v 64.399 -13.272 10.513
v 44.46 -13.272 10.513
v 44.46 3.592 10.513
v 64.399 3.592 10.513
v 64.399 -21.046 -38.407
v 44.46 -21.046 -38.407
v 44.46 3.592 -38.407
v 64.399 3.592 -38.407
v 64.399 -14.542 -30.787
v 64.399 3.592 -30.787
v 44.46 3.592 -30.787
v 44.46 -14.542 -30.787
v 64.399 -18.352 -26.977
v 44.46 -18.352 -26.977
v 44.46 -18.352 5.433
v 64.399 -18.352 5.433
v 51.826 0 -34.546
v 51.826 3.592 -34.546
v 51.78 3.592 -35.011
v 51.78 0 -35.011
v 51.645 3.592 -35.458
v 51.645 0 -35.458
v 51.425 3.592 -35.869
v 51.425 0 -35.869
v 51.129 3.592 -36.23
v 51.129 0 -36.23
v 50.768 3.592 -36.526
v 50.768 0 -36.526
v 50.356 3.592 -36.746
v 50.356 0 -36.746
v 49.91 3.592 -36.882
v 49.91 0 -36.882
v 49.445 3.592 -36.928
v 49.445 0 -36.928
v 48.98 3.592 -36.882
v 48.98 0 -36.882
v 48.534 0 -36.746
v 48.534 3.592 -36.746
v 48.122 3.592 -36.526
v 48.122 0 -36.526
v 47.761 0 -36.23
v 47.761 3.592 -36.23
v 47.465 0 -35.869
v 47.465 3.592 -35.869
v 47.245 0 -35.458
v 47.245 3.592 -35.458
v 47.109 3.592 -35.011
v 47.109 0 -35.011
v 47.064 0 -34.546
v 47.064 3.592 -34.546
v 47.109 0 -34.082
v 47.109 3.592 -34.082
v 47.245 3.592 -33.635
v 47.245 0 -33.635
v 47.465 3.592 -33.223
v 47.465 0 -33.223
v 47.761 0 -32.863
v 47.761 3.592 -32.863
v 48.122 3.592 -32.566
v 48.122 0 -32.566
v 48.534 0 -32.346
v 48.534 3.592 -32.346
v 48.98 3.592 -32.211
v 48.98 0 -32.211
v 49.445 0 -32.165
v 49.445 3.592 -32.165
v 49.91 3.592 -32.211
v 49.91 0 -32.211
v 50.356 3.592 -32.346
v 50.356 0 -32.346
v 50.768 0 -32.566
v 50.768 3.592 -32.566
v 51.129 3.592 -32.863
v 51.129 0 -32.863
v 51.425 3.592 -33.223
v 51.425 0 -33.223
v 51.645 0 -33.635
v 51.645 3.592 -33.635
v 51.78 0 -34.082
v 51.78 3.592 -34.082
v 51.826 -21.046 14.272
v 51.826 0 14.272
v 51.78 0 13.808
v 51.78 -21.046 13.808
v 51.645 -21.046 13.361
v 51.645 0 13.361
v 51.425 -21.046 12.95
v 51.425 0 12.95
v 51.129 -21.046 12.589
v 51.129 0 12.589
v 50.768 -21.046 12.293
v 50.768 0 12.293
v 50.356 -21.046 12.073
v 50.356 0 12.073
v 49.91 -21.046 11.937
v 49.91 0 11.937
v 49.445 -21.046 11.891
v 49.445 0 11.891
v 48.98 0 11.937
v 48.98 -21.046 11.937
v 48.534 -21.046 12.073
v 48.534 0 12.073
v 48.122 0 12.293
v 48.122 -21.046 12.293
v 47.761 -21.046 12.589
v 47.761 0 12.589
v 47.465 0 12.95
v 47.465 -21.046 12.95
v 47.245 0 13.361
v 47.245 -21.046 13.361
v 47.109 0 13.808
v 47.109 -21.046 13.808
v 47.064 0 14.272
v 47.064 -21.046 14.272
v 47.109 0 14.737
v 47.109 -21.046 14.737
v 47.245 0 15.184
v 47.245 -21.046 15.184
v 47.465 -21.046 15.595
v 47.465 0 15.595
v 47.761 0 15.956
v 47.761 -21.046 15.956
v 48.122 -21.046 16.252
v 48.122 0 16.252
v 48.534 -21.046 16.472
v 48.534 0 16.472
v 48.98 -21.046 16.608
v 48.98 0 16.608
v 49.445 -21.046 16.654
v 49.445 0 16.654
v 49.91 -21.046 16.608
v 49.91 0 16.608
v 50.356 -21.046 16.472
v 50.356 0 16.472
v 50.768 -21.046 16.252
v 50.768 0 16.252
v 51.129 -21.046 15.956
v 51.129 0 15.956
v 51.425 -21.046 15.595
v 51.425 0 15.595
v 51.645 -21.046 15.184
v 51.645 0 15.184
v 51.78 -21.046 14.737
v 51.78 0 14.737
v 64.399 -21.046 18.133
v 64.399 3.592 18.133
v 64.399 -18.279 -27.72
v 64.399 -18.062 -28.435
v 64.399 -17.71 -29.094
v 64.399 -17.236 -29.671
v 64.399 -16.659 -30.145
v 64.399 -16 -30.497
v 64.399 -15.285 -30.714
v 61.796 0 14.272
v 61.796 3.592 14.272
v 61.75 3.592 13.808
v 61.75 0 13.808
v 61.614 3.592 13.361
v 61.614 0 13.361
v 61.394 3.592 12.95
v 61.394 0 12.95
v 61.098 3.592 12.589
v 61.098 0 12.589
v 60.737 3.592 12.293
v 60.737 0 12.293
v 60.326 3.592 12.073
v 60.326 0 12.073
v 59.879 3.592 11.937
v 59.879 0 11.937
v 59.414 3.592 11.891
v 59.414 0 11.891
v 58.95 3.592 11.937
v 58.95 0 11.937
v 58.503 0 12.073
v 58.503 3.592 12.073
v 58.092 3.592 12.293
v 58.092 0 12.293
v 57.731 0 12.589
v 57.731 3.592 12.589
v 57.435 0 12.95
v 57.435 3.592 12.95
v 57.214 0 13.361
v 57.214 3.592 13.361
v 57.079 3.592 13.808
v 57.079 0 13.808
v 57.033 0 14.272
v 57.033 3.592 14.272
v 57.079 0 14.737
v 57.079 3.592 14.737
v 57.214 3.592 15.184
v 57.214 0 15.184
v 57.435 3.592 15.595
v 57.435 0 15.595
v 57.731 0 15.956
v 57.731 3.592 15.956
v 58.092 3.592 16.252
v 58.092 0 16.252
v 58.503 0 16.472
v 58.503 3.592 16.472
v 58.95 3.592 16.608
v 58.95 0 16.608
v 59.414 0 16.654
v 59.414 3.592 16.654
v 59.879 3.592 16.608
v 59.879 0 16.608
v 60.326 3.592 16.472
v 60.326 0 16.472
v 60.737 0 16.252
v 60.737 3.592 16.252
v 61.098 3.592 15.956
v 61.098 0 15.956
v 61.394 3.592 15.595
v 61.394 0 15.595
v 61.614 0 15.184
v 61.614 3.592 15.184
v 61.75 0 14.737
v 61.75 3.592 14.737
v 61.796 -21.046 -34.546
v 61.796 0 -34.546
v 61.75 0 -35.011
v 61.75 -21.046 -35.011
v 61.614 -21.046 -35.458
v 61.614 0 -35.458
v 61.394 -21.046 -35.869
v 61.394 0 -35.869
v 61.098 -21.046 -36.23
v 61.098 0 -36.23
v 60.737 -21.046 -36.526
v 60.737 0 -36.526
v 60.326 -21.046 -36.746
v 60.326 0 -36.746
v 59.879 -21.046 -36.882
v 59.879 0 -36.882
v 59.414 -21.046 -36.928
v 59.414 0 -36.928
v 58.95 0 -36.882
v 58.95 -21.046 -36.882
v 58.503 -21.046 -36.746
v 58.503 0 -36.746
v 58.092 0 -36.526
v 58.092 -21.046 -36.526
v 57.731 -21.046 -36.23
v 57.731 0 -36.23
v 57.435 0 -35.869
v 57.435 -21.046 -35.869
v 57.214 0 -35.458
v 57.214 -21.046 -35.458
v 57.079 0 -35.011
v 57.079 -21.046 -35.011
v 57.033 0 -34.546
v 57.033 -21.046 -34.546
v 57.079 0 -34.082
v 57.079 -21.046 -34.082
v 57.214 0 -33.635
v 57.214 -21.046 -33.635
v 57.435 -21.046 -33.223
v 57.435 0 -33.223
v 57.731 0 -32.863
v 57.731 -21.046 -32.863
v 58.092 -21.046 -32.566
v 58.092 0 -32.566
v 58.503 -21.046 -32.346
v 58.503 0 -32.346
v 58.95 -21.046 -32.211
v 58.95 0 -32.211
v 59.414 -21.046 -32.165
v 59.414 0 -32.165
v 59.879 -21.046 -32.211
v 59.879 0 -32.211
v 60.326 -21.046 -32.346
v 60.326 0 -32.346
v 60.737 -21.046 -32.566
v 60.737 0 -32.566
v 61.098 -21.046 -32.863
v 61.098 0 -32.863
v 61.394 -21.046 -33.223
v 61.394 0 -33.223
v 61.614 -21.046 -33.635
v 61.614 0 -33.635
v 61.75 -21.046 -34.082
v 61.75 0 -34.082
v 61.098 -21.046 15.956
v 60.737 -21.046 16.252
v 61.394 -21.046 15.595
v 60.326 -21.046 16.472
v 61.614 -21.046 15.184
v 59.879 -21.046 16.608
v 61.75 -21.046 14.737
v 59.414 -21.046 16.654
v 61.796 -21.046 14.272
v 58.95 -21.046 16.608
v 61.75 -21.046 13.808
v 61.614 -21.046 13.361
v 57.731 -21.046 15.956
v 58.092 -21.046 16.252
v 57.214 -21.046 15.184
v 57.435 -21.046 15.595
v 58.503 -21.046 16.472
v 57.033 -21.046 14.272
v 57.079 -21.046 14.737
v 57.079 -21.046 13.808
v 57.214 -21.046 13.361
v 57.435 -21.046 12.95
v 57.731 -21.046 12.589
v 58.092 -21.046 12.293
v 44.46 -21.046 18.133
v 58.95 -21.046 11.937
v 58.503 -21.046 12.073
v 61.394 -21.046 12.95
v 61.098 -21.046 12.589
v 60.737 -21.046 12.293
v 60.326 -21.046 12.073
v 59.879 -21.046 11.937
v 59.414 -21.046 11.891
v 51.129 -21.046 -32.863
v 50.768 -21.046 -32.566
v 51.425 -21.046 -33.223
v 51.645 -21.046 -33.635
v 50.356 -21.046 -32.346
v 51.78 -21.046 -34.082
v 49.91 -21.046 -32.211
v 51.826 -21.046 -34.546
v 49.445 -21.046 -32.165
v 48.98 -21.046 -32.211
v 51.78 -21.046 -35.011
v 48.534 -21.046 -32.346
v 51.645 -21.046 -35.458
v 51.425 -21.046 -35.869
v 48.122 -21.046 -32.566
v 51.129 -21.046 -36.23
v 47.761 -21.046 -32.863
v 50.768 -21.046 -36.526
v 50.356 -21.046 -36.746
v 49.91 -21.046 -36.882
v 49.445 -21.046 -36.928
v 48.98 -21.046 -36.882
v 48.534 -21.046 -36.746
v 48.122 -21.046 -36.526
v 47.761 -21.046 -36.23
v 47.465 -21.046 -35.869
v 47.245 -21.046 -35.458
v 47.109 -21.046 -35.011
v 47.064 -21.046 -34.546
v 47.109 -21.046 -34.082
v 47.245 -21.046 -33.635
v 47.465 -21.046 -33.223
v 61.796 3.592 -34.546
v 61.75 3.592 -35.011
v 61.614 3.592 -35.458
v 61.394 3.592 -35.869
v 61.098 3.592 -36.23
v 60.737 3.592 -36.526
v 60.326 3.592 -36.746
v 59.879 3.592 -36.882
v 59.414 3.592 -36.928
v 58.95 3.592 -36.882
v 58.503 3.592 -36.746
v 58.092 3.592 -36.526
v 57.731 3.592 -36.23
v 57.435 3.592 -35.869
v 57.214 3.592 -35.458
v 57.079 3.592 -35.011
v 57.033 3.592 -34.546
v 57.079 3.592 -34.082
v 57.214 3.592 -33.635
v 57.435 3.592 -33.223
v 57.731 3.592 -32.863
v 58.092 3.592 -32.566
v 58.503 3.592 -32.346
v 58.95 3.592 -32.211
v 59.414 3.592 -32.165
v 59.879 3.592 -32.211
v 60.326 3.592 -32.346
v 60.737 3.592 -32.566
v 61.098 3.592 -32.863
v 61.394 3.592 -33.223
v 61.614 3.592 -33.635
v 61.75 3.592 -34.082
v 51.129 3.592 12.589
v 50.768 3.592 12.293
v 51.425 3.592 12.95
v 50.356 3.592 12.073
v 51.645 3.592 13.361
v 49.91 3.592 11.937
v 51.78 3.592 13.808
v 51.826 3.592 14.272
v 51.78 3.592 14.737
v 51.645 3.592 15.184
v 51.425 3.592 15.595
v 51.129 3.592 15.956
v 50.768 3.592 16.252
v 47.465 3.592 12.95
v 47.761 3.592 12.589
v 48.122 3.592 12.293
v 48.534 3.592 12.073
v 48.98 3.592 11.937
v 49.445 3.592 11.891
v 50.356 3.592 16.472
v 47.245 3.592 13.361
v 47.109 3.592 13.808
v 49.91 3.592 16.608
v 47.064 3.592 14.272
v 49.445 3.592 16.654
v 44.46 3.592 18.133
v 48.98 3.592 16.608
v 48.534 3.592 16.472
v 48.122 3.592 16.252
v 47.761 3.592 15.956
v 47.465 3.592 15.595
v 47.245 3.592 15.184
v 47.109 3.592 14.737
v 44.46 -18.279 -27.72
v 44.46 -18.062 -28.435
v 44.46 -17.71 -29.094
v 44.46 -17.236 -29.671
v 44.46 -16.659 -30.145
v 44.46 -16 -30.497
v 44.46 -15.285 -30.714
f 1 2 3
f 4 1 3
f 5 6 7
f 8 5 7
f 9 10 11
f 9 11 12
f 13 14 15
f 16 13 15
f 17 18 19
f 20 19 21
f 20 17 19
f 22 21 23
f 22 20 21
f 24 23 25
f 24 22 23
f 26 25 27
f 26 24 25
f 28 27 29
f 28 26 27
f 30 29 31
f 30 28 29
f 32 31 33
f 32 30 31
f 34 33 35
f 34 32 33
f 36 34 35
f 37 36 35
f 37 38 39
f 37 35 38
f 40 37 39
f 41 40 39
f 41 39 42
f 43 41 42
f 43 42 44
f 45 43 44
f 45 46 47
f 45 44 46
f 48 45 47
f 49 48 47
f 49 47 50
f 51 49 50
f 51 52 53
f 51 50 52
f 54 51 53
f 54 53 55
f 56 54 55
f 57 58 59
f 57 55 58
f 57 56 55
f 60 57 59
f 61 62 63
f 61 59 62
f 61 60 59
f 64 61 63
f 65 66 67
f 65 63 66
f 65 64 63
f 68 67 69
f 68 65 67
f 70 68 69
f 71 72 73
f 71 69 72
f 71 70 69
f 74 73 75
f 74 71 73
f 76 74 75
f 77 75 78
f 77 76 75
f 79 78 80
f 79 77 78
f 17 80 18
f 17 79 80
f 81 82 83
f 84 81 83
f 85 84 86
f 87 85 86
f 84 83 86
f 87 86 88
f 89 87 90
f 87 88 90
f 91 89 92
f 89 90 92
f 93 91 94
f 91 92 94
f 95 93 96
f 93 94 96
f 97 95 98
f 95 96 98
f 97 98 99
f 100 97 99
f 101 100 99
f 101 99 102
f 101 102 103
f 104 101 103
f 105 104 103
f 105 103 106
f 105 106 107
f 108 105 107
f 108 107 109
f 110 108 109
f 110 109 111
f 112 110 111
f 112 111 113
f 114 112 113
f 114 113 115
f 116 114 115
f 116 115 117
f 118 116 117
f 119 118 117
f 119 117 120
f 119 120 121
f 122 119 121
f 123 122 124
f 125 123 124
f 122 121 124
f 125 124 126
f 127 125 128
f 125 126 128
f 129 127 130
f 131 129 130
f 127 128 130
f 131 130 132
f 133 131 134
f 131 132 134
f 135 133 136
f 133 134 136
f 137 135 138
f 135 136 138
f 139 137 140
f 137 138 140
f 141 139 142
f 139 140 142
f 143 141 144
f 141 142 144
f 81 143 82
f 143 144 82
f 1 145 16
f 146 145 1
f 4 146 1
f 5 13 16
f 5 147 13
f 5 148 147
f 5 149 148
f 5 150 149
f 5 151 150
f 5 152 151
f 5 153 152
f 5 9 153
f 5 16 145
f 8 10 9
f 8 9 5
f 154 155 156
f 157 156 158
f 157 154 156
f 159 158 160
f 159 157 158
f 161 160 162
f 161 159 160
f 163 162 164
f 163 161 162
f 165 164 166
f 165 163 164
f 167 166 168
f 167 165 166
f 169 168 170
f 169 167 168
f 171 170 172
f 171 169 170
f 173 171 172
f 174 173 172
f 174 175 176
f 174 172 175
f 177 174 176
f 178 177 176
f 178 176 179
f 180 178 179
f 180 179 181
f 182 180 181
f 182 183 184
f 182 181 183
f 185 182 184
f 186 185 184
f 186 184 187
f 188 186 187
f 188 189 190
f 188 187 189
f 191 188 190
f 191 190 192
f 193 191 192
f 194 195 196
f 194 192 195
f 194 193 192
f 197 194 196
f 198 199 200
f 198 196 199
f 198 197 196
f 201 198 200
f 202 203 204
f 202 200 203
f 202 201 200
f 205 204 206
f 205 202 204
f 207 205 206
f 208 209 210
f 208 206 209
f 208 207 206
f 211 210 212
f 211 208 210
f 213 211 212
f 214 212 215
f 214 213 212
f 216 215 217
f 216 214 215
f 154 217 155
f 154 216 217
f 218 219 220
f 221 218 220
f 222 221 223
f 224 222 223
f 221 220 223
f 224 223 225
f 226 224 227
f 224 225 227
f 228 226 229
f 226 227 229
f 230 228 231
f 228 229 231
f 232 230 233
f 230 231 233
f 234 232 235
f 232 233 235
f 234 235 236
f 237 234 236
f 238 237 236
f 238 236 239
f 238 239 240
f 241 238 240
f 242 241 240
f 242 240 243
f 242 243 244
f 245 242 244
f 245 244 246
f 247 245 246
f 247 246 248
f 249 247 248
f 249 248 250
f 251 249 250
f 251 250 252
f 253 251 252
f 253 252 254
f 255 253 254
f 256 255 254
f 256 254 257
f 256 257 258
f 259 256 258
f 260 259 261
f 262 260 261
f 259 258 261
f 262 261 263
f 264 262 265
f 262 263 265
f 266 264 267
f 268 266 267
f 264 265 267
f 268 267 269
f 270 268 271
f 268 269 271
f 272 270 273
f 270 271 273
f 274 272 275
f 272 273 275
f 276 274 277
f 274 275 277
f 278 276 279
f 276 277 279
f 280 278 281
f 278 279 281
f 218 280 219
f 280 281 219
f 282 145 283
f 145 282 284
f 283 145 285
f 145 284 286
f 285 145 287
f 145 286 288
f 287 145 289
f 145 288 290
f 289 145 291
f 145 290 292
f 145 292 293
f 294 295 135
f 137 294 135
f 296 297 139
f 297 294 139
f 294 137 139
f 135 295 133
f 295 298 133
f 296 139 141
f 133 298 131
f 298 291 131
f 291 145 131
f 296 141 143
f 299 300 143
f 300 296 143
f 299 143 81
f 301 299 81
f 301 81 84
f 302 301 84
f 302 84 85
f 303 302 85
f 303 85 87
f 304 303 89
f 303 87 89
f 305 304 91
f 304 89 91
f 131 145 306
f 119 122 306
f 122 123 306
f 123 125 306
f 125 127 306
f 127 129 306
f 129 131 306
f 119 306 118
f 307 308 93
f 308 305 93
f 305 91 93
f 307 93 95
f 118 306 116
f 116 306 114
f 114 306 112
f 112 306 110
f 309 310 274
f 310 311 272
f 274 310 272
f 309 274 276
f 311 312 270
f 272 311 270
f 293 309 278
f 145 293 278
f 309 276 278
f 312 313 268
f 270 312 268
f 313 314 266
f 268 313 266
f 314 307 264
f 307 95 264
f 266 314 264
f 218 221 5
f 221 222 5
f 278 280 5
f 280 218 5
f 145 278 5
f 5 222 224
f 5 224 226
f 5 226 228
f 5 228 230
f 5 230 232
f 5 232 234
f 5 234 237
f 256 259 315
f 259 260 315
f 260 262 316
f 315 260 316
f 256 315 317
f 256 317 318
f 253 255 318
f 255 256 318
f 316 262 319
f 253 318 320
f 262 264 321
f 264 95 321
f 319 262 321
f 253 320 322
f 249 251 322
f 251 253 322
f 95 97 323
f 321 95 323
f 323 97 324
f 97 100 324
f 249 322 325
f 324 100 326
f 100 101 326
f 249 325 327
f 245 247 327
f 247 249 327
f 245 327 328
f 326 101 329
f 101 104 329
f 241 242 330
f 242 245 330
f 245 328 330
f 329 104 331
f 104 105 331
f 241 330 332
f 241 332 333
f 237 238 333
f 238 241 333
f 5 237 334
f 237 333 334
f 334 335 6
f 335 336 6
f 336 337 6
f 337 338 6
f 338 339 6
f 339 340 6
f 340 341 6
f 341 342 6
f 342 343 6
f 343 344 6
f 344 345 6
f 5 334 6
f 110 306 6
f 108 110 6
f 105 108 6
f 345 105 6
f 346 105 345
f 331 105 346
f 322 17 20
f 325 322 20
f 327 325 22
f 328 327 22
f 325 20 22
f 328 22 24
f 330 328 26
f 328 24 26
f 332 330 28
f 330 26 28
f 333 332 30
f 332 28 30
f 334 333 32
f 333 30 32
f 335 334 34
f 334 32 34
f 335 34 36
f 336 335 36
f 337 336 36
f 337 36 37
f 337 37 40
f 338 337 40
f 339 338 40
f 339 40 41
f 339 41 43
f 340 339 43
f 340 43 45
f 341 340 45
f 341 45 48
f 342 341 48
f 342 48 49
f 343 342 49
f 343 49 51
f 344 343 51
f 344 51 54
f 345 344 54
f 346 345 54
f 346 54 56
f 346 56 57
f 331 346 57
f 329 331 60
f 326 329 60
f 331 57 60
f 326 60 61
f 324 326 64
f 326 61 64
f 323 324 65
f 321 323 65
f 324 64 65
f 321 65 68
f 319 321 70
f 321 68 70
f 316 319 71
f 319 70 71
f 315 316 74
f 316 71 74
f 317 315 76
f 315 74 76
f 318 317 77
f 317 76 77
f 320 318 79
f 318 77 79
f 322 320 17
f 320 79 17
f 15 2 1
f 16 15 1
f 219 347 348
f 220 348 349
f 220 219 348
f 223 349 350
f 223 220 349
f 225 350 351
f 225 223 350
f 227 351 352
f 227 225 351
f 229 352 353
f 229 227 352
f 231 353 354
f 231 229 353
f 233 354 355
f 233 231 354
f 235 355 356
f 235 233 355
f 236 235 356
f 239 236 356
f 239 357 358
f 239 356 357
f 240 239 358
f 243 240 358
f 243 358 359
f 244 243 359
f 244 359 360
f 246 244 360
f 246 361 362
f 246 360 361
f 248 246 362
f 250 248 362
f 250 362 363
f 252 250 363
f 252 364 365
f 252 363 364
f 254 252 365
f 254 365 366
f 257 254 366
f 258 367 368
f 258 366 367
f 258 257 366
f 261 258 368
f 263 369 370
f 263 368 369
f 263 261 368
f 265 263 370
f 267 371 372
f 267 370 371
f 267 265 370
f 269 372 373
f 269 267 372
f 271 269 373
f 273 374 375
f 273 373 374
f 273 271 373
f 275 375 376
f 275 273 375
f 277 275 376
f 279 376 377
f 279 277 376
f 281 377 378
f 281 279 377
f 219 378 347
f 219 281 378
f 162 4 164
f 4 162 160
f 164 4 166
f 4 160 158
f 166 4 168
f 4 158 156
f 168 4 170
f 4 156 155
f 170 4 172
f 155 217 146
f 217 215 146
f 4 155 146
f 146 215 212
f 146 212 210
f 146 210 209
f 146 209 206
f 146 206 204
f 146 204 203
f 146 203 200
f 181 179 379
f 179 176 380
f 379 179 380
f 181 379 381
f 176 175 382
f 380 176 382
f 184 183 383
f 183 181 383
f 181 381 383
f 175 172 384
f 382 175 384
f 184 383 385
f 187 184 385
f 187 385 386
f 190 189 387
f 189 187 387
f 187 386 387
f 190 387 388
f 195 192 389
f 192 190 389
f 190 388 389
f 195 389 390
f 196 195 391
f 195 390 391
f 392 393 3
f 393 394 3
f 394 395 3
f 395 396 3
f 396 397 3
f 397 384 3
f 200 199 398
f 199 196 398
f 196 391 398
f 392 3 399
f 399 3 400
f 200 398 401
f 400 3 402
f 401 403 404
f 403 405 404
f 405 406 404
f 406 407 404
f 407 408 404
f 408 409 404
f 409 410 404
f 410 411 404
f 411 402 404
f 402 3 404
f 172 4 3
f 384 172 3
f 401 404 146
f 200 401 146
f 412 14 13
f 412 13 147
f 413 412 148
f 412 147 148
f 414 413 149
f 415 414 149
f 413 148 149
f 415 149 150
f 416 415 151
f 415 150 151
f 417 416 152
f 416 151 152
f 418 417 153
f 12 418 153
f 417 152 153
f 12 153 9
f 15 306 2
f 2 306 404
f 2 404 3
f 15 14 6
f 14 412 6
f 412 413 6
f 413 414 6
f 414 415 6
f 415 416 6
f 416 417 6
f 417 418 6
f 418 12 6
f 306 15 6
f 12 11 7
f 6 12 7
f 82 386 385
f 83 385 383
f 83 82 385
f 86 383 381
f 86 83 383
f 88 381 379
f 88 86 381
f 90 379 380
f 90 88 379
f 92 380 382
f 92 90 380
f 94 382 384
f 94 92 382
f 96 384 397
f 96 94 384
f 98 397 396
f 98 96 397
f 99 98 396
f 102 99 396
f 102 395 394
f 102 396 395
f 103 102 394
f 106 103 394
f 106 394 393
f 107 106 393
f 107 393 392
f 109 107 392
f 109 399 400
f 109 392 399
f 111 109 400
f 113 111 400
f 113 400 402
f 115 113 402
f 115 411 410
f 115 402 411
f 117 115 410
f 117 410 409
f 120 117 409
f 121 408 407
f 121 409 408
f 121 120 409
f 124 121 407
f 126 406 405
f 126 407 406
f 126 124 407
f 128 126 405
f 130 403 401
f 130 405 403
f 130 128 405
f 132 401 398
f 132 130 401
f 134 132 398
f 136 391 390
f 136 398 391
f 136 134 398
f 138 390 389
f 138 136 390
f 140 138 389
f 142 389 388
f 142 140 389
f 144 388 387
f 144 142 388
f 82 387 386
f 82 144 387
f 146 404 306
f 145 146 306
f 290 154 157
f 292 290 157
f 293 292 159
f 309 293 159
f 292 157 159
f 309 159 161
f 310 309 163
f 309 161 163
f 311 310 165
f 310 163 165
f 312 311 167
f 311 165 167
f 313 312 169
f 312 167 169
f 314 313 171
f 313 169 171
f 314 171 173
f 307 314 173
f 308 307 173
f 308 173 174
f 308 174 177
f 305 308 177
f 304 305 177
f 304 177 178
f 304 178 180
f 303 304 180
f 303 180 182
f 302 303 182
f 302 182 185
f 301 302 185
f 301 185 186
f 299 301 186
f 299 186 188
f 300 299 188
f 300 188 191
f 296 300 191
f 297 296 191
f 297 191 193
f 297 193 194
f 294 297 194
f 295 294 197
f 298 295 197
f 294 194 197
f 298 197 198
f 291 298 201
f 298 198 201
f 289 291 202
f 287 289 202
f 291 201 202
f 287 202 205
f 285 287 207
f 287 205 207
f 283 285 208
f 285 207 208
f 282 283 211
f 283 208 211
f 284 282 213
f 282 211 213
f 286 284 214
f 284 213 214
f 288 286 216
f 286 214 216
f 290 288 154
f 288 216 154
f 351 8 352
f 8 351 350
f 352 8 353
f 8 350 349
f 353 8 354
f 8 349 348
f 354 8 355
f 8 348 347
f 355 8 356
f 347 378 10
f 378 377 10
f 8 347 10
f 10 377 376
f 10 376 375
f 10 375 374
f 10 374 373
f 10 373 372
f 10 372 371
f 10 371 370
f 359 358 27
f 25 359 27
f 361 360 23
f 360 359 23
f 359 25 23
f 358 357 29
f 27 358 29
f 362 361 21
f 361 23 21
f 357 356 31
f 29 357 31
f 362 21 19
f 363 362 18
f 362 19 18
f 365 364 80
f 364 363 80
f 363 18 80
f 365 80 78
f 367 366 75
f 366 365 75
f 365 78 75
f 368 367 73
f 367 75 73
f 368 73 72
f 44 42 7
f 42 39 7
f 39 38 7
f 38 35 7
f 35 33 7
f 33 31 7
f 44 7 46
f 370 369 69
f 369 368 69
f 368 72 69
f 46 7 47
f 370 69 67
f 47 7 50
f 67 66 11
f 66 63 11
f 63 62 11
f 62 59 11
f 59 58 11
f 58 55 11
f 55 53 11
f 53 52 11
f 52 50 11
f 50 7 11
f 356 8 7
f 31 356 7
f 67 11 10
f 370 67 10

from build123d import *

# Parameters (mm, degrees)
BOSS_EXTRUDE3_START     = 44.460213
BOSS_EXTRUDE3_DEPTH     = 19.939
CHAMFER2_SIZE           = 5.08
FILLET2_R               = 3.81
SKETCH4_R               = 2.38125
CUT_EXTRUDE1_DEPTH      = 4.591914717
CUT_EXTRUDE1_DEPTH_BACK = 22.046085283


with BuildPart() as part:
    # Sketch3 → Boss-Extrude3 (new body)
    with BuildSketch(Plane(origin=(0, 0, 0), x_dir=(0, 0, -1), z_dir=(1, 0, 0)).offset(BOSS_EXTRUDE3_START)):
        Polygon((30.787104637, 3.591914717), (30.787104637, -18.352057258), (-10.513295363, -18.352057258), (-10.513295363, 3.591914717), (-18.133295363, 3.591914717), (-18.133295363, -21.046085283), (38.407104637, -21.046085283), (38.407104637, 3.591914717), align=None)
    extrude(amount=BOSS_EXTRUDE3_DEPTH)

    # Chamfer2
    chamfer2_edges = [part.edges().sort_by_distance(p)[0] for p in [
        (54.429713, -18.352057258, 10.513295363),
    ]]
    chamfer(chamfer2_edges, length=CHAMFER2_SIZE)

    # Fillet2
    fillet2_edges = [part.edges().sort_by_distance(p)[0] for p in [
        (54.429713, -18.352057258, -30.787104637),
    ]]
    fillet(fillet2_edges, radius=FILLET2_R)

    # Sketch4 → Cut-Extrude1 (cut, two sides)
    with BuildSketch(Plane(origin=(0, 0, 0), x_dir=(1, 0, 0), z_dir=(0, 1, 0))) as cut_extrude1_sk:
        with Locations((49.444963475, 34.546304637)):
            Circle(SKETCH4_R)
        with Locations((59.414463475, 34.546304637)):
            Circle(SKETCH4_R)
        with Locations((49.444963475, -14.272495363)):
            Circle(SKETCH4_R)
        with Locations((59.414463475, -14.272495363)):
            Circle(SKETCH4_R)
    extrude(amount=CUT_EXTRUDE1_DEPTH, mode=Mode.SUBTRACT)
    extrude(cut_extrude1_sk.sketch, amount=-CUT_EXTRUDE1_DEPTH_BACK, mode=Mode.SUBTRACT)


solid = part.part
